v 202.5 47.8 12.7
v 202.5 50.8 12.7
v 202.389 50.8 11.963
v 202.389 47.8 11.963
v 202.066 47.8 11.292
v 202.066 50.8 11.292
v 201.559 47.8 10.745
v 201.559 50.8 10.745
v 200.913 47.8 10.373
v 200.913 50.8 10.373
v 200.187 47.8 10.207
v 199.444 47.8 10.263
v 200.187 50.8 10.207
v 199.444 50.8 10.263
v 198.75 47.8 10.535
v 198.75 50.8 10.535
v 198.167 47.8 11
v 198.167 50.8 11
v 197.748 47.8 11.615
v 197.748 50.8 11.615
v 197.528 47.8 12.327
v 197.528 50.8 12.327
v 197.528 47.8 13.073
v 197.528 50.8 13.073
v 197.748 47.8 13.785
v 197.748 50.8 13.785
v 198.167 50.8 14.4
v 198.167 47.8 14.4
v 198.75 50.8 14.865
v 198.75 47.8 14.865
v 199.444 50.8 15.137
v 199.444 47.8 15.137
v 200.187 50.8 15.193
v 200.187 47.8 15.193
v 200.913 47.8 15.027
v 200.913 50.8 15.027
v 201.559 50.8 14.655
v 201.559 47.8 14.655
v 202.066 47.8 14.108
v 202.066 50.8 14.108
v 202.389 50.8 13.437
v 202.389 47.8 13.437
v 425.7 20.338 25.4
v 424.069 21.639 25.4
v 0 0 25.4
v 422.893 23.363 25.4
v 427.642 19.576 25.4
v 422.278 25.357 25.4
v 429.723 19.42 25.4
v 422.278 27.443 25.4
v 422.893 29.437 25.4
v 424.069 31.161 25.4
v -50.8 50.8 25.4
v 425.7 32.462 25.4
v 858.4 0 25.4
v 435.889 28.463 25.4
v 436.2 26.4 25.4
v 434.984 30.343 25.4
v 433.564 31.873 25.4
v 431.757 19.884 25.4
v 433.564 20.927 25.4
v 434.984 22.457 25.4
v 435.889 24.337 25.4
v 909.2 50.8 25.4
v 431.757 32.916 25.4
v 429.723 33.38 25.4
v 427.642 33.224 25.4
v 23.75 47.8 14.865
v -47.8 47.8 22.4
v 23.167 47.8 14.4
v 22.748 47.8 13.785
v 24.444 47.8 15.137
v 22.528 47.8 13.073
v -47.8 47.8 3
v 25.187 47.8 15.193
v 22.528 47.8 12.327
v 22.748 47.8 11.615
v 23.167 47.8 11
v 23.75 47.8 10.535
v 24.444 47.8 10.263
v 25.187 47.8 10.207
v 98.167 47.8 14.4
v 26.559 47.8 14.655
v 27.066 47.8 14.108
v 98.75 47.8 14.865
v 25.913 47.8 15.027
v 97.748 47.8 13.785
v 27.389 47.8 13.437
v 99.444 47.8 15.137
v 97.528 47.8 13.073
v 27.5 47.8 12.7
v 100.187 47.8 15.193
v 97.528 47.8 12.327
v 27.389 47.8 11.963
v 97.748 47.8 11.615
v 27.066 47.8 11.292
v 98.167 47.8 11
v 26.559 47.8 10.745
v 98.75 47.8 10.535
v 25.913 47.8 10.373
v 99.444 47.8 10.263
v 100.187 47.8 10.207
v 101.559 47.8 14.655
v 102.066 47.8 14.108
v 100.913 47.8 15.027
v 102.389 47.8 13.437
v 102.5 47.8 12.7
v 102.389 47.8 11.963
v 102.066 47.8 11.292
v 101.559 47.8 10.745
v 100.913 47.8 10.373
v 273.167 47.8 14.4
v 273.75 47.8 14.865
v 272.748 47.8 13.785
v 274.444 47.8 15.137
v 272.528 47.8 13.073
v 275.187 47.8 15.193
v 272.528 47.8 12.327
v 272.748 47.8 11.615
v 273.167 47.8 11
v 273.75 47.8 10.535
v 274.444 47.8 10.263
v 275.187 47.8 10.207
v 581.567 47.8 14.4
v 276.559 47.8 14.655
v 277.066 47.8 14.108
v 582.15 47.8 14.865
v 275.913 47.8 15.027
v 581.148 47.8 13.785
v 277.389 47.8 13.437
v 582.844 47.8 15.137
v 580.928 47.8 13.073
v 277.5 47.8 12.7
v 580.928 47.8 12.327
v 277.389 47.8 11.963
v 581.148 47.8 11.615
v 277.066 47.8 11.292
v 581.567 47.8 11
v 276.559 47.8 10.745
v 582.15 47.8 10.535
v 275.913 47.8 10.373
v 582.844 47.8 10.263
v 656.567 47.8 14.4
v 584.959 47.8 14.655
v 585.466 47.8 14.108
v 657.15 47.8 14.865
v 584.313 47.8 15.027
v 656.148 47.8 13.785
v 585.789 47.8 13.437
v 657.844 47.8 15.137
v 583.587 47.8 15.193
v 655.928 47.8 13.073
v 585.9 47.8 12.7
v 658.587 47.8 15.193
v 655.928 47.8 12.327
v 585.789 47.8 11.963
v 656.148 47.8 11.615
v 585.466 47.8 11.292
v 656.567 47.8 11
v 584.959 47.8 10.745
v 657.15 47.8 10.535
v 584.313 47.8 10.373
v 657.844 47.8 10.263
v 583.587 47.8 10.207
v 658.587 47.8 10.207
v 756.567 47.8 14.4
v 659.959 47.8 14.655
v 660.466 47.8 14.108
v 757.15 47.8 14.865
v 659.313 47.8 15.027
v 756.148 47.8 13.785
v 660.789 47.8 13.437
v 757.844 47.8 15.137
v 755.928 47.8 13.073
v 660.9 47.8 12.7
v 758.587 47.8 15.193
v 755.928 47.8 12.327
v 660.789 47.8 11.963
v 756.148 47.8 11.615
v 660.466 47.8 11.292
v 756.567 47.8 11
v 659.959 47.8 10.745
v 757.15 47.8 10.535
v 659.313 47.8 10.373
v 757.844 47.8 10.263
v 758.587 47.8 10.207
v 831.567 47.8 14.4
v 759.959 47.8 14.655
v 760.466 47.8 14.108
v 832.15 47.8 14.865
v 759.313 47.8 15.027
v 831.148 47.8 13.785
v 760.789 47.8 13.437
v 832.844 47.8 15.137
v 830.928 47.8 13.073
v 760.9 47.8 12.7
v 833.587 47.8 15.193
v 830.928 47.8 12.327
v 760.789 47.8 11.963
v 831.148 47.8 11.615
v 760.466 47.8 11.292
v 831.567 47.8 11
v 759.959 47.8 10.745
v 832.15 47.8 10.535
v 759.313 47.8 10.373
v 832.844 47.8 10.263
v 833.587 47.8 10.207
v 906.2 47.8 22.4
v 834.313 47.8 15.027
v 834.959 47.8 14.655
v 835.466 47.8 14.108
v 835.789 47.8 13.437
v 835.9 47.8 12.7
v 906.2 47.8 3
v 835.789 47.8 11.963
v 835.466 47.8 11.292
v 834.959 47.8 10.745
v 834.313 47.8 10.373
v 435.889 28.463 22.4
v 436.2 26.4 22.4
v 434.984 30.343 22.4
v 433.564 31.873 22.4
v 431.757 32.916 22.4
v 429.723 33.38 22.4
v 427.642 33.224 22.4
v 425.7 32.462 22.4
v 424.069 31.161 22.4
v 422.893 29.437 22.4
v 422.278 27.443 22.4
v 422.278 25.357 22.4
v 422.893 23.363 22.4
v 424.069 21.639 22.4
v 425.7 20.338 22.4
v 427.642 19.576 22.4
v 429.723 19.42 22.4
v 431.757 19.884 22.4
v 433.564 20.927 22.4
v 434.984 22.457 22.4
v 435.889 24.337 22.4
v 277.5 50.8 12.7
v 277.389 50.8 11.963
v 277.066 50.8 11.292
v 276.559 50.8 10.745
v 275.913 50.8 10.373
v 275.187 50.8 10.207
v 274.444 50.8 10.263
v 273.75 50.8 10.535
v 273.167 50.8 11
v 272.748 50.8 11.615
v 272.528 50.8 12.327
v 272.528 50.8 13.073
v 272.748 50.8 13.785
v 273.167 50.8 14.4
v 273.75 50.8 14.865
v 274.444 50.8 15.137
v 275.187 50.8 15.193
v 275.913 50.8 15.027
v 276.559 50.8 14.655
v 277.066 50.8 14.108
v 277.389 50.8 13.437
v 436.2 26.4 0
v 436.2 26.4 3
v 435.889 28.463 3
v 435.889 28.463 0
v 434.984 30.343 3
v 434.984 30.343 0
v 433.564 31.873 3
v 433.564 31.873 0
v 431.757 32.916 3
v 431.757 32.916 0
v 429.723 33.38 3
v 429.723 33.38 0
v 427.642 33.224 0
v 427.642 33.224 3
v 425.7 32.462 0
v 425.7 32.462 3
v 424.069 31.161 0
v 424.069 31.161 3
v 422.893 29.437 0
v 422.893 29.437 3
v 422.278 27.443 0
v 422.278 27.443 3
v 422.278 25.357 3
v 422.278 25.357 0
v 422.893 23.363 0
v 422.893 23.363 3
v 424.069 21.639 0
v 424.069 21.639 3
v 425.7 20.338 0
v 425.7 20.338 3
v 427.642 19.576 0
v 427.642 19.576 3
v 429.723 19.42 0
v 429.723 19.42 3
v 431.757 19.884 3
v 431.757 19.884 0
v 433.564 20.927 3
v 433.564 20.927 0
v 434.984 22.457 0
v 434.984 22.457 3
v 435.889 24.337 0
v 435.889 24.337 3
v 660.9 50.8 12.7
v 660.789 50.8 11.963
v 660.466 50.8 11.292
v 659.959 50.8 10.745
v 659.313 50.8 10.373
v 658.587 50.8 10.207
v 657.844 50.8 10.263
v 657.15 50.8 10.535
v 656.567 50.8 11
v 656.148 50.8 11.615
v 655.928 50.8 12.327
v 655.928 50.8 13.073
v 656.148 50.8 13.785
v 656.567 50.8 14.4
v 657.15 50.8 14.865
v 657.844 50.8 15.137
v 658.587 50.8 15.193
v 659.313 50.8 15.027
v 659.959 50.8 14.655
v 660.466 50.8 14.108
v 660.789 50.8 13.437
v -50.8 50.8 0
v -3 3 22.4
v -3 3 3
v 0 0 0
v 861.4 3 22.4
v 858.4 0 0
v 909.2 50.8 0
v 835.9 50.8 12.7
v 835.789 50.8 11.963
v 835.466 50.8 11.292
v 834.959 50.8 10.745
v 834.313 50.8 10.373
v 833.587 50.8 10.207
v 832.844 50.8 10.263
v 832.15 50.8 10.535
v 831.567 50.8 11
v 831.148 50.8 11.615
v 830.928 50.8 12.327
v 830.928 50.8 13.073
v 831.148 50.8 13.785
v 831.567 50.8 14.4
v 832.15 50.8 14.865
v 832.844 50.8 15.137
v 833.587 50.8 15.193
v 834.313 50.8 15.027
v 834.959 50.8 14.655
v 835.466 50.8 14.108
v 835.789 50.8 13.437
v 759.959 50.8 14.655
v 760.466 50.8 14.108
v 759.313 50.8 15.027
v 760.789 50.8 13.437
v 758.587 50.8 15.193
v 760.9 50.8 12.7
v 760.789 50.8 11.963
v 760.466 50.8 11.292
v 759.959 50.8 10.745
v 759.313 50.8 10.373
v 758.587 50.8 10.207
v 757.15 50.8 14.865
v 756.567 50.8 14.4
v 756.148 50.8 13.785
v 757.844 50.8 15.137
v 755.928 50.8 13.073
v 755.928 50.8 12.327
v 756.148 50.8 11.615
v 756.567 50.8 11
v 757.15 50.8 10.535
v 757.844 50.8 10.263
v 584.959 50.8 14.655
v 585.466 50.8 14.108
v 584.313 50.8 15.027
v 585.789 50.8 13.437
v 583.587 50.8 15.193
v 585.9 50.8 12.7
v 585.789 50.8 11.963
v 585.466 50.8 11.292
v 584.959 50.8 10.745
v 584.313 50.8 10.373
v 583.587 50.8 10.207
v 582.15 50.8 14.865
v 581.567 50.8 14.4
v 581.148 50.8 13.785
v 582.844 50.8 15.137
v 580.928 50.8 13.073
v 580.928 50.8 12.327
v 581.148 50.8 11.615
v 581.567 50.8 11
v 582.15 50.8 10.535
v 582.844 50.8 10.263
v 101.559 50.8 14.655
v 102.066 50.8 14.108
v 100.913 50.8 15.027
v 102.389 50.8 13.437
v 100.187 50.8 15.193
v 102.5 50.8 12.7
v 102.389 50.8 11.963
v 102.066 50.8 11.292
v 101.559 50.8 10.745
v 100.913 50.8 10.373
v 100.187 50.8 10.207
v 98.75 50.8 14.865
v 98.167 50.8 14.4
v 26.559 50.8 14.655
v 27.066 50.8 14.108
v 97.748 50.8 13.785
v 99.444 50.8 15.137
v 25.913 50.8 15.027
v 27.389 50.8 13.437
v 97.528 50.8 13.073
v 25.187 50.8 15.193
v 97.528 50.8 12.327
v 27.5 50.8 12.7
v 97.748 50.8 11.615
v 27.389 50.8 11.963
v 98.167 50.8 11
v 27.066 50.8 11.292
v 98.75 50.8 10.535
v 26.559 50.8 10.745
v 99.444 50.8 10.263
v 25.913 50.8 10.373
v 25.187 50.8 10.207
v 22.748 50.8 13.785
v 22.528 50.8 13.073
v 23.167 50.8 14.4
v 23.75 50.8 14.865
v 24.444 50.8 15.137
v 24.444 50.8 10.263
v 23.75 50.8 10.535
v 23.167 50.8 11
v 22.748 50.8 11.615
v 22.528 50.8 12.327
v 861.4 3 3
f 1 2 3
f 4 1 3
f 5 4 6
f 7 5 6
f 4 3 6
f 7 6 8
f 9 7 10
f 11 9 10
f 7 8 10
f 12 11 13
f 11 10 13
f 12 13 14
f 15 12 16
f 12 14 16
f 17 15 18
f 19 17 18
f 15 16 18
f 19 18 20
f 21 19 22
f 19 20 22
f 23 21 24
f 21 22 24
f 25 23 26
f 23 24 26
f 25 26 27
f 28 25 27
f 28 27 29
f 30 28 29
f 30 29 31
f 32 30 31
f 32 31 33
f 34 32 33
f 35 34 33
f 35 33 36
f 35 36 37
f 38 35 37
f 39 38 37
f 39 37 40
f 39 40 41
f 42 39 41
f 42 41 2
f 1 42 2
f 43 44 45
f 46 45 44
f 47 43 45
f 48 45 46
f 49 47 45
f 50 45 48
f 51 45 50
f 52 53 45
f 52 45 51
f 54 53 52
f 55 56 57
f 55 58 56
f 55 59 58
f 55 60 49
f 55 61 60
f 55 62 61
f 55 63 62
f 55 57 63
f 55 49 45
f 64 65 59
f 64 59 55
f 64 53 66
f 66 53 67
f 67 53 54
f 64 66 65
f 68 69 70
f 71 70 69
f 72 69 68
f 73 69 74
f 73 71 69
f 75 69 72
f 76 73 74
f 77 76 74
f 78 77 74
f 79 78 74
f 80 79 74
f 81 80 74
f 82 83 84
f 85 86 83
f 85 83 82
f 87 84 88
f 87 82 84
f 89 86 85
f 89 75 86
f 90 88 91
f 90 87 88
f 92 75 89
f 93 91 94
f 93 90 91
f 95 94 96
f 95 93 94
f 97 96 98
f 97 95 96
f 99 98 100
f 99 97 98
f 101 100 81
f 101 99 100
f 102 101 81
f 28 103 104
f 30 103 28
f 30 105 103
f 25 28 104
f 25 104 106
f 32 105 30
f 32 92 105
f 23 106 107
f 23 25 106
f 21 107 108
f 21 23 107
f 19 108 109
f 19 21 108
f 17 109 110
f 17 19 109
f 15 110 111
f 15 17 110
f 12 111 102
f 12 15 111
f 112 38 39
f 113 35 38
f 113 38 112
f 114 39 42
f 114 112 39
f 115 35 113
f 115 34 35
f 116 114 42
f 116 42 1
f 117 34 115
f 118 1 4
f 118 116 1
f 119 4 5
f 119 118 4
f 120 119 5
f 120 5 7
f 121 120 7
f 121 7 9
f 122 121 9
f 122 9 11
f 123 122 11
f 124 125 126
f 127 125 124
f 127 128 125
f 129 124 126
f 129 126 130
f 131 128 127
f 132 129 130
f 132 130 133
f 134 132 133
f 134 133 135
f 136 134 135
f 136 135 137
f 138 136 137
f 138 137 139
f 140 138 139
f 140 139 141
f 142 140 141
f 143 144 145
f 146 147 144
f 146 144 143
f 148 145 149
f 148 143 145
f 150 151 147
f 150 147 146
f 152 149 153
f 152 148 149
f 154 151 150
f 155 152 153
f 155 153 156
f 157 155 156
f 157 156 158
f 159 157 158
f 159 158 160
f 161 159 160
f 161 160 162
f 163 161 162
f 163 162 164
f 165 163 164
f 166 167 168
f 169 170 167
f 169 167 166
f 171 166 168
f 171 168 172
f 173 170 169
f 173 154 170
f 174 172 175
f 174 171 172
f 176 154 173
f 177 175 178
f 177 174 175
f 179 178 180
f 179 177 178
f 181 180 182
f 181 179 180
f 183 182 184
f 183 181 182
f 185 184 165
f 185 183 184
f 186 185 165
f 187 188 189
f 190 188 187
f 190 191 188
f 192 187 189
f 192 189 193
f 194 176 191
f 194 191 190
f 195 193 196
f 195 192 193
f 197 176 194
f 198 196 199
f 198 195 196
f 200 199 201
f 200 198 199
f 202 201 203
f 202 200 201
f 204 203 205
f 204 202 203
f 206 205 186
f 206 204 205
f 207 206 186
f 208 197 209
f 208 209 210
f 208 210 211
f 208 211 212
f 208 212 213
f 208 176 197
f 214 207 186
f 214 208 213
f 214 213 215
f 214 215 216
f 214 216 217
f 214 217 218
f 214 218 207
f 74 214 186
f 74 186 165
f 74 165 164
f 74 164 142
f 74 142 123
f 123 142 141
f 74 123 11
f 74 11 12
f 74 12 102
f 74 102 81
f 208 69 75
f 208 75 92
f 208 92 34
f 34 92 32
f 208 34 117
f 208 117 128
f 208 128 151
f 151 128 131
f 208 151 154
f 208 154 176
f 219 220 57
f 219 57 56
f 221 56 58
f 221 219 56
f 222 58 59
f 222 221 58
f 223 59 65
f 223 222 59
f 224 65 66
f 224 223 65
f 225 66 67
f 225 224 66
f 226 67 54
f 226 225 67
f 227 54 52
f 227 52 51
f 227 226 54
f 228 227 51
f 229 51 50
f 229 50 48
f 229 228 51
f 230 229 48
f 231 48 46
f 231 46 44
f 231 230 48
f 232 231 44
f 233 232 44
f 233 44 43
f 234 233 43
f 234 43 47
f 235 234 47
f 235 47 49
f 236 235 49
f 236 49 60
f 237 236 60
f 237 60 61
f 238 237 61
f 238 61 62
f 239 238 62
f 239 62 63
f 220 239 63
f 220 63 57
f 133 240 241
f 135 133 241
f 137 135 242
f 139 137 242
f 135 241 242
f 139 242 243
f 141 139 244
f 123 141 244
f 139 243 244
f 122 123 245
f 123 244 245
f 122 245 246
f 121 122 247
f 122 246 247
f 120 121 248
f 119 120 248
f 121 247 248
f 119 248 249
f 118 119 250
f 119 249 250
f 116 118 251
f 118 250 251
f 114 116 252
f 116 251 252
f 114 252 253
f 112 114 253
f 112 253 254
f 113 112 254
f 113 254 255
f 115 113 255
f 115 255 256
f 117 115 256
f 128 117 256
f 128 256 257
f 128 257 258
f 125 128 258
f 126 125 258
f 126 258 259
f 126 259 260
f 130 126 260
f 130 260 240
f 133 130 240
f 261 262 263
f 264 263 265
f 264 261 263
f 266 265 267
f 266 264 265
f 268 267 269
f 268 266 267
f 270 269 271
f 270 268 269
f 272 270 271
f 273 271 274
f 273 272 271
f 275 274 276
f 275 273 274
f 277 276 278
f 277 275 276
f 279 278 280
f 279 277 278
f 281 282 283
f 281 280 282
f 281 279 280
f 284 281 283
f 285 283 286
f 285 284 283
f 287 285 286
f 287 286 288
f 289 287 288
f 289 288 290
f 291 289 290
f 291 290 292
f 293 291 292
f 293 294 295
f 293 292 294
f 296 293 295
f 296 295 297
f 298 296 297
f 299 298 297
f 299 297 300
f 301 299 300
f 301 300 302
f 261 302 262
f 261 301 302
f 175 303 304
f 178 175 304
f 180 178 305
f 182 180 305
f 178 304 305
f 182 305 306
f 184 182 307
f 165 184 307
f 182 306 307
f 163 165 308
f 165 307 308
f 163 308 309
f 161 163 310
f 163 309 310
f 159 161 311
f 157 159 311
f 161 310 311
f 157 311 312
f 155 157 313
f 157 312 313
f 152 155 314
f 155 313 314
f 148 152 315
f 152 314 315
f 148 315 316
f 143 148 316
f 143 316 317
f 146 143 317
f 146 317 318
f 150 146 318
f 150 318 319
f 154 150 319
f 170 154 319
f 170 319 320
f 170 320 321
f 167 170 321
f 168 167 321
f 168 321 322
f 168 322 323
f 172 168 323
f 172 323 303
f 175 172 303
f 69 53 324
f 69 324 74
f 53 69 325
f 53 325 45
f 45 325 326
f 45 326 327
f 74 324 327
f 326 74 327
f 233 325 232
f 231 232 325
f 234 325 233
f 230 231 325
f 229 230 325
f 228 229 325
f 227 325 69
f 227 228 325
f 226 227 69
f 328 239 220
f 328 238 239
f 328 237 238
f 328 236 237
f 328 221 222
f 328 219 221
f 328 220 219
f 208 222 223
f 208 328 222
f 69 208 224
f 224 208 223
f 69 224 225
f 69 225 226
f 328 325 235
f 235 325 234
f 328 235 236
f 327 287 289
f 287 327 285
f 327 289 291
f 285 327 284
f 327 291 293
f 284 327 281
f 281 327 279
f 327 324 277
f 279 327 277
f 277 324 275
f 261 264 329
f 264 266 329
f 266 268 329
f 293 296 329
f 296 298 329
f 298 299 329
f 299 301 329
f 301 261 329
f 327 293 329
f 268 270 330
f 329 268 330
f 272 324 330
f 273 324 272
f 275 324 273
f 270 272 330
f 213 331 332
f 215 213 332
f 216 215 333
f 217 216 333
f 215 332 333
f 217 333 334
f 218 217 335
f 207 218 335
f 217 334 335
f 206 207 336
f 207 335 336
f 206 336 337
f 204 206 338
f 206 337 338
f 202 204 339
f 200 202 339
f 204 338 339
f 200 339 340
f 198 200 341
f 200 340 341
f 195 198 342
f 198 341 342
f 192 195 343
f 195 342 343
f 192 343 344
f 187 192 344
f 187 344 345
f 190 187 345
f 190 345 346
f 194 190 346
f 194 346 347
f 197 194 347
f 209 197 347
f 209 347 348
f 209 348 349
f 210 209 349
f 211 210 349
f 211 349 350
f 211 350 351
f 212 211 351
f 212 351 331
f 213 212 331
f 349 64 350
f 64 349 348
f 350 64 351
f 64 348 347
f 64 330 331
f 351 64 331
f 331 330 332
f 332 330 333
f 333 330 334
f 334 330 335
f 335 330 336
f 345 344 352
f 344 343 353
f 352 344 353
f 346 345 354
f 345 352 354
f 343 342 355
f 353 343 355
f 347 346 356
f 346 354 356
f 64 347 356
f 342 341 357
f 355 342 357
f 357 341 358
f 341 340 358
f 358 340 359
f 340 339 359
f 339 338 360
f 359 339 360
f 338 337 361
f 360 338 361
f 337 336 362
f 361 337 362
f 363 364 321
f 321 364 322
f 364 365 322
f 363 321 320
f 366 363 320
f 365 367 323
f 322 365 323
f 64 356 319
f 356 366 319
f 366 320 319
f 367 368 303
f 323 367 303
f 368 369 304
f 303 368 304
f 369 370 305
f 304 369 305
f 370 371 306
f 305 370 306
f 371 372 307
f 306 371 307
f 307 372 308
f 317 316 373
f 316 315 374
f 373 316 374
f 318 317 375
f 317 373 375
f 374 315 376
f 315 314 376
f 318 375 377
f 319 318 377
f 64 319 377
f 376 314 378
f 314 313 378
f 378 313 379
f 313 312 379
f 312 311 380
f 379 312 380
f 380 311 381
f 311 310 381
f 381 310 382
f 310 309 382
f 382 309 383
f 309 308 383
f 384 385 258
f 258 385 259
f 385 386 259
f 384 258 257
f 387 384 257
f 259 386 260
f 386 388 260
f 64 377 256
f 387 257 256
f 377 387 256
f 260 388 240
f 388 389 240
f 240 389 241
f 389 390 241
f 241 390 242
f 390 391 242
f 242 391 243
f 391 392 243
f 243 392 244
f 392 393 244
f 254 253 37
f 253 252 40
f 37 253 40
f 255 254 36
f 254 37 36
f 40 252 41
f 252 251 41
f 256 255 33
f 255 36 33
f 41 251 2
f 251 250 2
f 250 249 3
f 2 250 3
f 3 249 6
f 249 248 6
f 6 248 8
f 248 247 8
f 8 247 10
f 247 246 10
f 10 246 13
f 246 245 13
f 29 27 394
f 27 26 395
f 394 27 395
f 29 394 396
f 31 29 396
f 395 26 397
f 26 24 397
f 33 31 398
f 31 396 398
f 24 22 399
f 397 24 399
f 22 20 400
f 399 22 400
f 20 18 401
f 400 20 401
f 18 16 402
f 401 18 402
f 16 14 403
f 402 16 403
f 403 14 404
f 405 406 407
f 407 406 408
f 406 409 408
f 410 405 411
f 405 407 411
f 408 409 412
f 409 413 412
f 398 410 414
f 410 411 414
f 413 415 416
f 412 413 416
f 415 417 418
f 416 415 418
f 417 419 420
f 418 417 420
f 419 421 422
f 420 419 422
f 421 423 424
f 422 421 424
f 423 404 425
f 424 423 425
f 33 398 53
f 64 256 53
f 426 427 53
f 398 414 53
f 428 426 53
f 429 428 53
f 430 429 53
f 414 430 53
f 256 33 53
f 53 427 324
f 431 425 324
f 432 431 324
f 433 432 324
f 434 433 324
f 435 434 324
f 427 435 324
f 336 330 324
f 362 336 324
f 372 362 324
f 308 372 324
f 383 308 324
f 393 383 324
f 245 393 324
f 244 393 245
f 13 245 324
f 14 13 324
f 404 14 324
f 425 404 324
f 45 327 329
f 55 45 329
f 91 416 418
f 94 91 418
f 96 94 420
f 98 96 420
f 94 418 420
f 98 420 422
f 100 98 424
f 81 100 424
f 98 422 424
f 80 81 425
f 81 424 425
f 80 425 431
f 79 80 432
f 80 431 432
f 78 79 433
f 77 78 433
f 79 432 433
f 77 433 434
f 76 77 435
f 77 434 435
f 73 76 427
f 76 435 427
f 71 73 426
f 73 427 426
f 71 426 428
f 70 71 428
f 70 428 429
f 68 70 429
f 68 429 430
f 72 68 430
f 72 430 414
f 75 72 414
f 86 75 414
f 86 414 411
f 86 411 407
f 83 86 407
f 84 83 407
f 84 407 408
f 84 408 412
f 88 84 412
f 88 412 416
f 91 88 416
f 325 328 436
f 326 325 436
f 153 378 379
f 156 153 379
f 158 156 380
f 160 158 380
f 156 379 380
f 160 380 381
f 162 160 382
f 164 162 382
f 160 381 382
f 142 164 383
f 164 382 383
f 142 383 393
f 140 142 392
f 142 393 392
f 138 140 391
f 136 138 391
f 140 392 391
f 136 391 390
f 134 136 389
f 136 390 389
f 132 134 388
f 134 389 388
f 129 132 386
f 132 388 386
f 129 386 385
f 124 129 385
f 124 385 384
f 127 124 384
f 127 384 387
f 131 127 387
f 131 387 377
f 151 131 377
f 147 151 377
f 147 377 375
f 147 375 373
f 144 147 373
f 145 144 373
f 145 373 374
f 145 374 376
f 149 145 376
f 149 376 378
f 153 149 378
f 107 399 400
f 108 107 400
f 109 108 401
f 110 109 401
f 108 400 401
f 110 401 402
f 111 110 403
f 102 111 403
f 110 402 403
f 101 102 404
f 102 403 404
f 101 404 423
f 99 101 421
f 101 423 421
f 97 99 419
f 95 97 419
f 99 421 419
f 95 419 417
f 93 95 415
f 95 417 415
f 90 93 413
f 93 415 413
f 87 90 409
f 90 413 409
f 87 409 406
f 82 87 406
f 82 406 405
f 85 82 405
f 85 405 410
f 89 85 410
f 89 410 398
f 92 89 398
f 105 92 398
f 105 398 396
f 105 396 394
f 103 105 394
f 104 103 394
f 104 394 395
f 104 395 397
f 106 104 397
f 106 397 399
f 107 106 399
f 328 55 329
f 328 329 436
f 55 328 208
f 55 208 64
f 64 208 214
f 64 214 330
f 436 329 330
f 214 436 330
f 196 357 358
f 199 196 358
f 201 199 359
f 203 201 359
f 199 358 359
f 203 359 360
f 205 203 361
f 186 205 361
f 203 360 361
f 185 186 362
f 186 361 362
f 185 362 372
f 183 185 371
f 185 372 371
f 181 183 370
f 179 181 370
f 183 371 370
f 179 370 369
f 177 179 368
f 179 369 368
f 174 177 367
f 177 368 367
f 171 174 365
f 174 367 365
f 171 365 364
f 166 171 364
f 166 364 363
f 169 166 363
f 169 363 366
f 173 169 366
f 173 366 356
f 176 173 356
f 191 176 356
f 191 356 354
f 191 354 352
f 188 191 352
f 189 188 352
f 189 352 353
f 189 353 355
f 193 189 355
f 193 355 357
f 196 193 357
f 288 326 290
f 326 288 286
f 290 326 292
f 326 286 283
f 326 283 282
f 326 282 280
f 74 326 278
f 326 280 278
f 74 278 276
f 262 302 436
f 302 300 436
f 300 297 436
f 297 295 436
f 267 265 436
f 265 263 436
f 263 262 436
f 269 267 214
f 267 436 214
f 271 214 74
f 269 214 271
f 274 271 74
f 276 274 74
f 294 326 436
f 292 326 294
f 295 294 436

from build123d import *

# Parameters (mm, degrees)
SKETCH1_R               = 7
BOSS_EXTRUDE1_DEPTH     = 25.4
CUT_EXTRUDE1_DEPTH      = 1046.4
CUT_EXTRUDE1_DEPTH_BACK = 201.4
SKETCH3_W               = 19.4
SKETCH3_H               = 44.8
CUT_EXTRUDE2_DEPTH      = 22
CUT_EXTRUDE2_DEPTH_BACK = 22
SKETCH4_R               = 2.5


with BuildPart() as part:
    # Sketch1 → Boss-Extrude1 (new body)
    with BuildSketch(Plane.XY):
        Polygon((-50.8, 50.8), (0, 0), (858.4, 0), (909.2, 50.8), align=None)
        with Locations((429.2, 26.4)):
            Circle(SKETCH1_R, mode=Mode.SUBTRACT)
    extrude(amount=BOSS_EXTRUDE1_DEPTH)

    # Sketch3 → Cut-Extrude1 (cut, two sides: drawn at the far end of the back side and taken through both)
    with BuildSketch(Plane(origin=(0, 0, 0), x_dir=(0, 0, -1), z_dir=(1, 0, 0)).offset(-CUT_EXTRUDE1_DEPTH_BACK)):
        with Locations((-12.7, 25.4)):
            Rectangle(SKETCH3_W, SKETCH3_H)
    extrude(amount=CUT_EXTRUDE1_DEPTH + CUT_EXTRUDE1_DEPTH_BACK, mode=Mode.SUBTRACT)

    # Sketch4 → Cut-Extrude2 (cut, two sides: drawn at the far end of the back side and taken through both)
    with BuildSketch(Plane(origin=(0, 50.8, 0), x_dir=(1, 0, 0), z_dir=(0, 1, 0)).offset(-CUT_EXTRUDE2_DEPTH_BACK)):
        with Locations((25, -12.7)):
            Circle(SKETCH4_R)
        with Locations((100, -12.7)):
            Circle(SKETCH4_R)
        with Locations((200, -12.7)):
            Circle(SKETCH4_R)
        with Locations((275, -12.7)):
            Circle(SKETCH4_R)
        with Locations((833.4, -12.7)):
            Circle(SKETCH4_R)
        with Locations((758.4, -12.7)):
            Circle(SKETCH4_R)
        with Locations((658.4, -12.7)):
            Circle(SKETCH4_R)
        with Locations((583.4, -12.7)):
            Circle(SKETCH4_R)
    extrude(amount=CUT_EXTRUDE2_DEPTH + CUT_EXTRUDE2_DEPTH_BACK, mode=Mode.SUBTRACT)


solid = part.part
